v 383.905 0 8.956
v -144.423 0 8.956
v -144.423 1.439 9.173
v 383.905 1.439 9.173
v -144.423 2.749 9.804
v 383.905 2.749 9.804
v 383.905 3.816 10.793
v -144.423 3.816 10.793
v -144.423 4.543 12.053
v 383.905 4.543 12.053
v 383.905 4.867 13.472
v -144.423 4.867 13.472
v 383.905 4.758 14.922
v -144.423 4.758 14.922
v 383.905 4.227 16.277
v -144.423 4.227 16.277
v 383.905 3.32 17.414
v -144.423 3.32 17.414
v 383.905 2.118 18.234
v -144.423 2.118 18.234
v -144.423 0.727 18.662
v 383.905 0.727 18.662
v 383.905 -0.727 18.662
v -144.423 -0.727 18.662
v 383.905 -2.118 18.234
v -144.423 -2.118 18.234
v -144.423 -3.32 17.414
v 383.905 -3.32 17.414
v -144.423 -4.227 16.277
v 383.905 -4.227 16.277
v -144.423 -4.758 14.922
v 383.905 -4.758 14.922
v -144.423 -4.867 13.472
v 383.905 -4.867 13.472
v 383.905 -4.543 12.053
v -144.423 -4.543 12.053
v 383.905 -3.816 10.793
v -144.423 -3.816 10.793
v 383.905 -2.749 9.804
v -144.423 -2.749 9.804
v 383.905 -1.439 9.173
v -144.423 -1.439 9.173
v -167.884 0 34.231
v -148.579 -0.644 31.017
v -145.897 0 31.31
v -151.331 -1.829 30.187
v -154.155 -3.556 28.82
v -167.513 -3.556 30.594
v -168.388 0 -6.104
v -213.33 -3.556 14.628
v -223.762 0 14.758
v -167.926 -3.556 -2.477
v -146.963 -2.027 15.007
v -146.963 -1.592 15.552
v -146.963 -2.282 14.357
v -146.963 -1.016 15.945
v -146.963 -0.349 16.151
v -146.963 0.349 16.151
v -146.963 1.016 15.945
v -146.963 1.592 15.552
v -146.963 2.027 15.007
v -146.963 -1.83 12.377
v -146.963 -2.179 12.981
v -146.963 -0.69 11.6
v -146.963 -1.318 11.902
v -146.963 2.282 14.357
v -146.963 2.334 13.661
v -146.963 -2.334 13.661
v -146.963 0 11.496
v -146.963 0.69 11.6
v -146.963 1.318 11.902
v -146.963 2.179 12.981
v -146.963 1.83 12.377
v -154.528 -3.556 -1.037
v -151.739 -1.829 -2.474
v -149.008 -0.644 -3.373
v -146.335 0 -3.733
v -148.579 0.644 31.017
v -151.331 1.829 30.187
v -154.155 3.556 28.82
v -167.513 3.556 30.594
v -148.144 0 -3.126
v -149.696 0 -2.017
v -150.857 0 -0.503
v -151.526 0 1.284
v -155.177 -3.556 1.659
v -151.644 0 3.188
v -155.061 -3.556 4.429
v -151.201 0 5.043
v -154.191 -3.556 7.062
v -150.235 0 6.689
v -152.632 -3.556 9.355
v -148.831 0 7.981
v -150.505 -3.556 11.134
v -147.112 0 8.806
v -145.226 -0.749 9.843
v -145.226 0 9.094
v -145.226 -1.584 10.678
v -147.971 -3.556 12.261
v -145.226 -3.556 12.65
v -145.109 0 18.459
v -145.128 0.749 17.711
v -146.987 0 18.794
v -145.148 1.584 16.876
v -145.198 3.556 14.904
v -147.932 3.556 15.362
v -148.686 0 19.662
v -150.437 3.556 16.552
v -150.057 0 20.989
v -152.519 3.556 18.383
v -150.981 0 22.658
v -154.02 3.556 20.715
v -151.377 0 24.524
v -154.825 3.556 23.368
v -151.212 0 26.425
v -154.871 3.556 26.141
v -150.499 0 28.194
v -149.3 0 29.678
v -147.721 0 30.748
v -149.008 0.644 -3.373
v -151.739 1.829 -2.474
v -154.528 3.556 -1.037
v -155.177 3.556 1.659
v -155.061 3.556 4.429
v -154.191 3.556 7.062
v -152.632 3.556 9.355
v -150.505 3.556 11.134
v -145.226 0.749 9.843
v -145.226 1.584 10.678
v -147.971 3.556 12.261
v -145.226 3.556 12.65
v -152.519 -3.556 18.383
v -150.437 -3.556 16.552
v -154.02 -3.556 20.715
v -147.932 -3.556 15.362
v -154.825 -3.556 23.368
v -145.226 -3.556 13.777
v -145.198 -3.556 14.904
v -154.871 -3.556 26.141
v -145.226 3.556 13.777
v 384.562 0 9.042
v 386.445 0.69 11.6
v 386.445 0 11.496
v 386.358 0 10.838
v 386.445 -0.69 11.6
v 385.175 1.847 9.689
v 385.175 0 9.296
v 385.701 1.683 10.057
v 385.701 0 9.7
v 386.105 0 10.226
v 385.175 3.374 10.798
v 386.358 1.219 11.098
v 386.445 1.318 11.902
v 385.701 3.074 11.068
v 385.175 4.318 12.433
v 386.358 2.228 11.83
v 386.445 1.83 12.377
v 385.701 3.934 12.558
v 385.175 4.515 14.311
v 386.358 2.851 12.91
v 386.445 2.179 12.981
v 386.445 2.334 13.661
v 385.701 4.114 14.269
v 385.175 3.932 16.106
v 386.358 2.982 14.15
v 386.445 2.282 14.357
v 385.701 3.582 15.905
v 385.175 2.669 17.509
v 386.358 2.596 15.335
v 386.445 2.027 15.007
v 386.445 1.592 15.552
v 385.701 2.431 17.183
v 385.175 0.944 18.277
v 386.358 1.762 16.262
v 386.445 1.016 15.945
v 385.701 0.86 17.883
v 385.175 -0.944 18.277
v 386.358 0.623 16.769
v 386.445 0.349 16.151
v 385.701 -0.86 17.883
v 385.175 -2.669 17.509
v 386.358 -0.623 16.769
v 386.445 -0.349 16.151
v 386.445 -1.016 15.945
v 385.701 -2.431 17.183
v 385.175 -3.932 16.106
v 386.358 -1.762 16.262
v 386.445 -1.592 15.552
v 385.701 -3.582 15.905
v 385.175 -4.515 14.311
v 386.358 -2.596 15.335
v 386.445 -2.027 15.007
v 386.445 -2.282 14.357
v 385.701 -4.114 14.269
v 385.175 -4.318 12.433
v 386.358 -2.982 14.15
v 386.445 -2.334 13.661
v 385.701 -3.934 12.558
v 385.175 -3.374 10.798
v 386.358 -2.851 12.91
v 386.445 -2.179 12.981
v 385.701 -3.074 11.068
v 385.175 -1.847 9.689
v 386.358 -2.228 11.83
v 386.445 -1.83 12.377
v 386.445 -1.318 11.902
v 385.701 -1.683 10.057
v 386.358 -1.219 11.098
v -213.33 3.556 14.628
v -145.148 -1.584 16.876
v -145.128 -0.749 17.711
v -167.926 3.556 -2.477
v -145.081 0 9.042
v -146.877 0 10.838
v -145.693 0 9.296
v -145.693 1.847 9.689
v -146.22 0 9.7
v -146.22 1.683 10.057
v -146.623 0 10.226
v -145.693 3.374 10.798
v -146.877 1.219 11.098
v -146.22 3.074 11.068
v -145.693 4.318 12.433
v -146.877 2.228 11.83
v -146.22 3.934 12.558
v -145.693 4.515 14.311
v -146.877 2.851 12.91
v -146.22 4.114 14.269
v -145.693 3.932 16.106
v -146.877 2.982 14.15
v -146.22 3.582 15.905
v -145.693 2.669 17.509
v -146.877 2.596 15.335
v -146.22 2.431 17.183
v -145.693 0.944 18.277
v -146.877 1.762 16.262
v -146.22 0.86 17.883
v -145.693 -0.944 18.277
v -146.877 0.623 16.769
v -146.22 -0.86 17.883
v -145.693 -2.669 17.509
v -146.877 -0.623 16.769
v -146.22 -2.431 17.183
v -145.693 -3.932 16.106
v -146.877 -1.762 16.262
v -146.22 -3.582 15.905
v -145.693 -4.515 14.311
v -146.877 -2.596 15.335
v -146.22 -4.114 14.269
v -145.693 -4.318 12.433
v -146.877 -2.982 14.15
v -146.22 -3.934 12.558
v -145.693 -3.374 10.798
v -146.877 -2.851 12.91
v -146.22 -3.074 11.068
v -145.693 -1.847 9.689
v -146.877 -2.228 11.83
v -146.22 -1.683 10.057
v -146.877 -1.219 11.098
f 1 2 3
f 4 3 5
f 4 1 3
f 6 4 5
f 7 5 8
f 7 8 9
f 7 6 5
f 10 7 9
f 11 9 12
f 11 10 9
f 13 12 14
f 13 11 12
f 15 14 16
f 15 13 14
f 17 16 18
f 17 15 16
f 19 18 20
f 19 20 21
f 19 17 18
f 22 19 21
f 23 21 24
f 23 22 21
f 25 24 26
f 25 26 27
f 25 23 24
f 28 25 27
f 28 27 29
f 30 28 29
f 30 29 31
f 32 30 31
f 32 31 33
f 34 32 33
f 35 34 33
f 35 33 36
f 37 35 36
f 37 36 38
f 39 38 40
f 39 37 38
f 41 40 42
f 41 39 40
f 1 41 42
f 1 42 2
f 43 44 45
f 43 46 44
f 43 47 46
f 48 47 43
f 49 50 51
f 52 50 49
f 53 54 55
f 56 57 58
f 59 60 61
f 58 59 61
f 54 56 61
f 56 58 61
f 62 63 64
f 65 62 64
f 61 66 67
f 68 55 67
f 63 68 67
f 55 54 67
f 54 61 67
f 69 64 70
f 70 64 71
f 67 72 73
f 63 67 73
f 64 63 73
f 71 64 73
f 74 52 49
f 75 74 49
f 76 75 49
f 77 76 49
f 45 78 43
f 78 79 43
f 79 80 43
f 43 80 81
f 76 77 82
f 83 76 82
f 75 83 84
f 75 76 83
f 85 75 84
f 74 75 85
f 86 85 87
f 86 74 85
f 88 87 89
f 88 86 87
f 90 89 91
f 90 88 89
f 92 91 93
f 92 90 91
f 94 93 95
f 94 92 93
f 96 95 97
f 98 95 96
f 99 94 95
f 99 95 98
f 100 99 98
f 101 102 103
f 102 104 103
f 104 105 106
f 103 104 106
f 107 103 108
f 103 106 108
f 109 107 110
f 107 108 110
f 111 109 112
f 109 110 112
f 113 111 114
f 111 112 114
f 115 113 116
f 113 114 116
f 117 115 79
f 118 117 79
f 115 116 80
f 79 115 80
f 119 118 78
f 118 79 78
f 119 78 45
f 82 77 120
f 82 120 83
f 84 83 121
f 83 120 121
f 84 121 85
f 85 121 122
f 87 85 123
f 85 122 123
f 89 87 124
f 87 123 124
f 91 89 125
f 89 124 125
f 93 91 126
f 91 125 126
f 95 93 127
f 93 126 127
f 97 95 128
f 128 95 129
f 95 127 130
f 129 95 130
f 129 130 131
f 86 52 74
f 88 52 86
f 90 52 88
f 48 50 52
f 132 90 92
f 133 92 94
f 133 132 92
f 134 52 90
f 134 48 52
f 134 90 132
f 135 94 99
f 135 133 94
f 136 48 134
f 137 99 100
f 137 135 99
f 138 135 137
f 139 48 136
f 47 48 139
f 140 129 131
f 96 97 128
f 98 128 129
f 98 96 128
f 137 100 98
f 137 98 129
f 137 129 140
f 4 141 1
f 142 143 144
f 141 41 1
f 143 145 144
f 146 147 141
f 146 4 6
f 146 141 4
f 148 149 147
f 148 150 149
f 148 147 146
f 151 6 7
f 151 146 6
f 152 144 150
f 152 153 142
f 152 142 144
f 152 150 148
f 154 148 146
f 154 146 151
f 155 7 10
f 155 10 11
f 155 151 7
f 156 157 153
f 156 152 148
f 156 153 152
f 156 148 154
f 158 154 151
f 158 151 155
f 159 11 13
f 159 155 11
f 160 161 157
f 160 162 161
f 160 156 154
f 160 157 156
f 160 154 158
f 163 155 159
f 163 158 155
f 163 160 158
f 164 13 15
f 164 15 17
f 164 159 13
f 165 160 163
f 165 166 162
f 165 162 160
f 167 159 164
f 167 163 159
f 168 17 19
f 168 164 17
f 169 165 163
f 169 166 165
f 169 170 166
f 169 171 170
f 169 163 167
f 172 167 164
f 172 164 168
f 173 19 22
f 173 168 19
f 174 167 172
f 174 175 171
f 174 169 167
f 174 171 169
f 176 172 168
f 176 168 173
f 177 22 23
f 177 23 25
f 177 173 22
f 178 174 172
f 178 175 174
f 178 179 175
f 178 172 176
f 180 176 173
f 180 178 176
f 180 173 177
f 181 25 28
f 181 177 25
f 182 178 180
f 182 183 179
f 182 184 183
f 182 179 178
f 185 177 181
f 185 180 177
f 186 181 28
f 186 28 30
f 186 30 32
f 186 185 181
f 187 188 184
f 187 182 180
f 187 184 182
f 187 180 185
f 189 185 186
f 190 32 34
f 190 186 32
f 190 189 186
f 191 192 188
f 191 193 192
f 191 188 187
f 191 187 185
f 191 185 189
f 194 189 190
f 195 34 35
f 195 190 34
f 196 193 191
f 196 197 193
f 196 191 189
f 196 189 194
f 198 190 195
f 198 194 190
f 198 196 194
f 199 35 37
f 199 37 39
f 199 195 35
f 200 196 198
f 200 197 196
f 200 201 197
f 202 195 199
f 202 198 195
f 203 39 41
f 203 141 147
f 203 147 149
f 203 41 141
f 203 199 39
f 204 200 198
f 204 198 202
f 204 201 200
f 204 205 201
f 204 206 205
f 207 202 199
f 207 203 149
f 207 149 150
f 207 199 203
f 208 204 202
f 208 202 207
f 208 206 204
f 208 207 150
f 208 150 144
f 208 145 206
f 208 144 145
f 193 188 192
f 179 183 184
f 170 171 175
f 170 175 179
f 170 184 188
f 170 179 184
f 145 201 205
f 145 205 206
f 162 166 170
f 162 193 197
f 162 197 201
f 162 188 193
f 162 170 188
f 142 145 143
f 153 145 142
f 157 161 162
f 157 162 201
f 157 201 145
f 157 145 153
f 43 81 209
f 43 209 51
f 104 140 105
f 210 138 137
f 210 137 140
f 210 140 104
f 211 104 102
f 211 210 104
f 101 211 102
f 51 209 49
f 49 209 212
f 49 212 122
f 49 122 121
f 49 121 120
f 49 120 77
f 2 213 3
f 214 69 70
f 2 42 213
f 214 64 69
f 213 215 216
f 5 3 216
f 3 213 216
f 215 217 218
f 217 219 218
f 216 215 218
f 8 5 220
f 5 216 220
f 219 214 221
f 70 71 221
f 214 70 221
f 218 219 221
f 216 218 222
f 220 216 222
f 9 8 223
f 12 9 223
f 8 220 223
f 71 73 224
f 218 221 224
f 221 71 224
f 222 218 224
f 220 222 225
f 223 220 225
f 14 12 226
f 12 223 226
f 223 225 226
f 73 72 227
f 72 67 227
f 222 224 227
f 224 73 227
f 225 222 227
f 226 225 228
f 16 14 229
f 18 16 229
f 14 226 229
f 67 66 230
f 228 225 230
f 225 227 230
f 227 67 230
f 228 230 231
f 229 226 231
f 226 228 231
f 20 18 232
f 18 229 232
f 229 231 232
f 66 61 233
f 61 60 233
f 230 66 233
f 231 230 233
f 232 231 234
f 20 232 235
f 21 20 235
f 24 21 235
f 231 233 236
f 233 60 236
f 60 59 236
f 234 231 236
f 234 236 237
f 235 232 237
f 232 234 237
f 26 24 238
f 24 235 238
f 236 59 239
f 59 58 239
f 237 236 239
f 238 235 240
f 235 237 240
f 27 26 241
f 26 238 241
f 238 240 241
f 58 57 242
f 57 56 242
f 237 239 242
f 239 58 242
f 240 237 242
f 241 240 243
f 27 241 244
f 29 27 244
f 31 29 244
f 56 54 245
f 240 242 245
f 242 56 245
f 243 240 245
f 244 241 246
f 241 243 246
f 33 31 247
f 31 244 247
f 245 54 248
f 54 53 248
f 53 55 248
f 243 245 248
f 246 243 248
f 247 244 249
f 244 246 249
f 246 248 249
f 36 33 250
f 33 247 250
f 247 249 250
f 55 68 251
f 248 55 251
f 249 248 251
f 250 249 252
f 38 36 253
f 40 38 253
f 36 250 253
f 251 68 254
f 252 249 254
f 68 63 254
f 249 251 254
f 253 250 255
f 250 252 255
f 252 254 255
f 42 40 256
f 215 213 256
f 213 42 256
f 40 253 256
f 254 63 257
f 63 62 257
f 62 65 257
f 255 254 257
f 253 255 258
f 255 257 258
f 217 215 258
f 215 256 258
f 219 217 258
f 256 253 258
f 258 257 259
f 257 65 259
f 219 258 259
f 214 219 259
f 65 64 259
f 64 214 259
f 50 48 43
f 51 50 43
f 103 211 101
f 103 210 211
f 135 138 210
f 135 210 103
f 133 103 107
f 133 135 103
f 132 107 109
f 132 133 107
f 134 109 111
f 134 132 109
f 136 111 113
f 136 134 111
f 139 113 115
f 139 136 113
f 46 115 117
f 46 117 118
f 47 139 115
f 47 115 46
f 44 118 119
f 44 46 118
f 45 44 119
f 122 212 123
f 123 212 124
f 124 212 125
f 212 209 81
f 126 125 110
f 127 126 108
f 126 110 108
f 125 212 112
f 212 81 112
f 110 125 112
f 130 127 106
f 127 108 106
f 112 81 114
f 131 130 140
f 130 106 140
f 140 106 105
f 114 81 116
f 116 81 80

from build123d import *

# Parameters (mm, degrees)
F0_W     = 533.4084779024
F0_H     = 4.8805493861
F3_R     = 2.54
F4_DEPTH = 3.556
F5_SIZE  = 3.55599
F6_R     = 2.54


# Not quite as in the source:
# - a fillet or chamfer is up to 0.001 mm smaller than in the source, because OpenCascade refuses the exact size
# - a feature names something its author has since deleted; it is built from what else it names


with BuildPart() as f1:
    # F0 (on Front) → F1 (revolve)
    with BuildSketch(Plane.XZ):
        with Locations((119.7407469153, 11.39604114)):
            Rectangle(F0_W, F0_H)
    revolve(axis=Axis((119.7407469153, 0, 13.836315833), (1, 0, 0)))

    # F3
    f3_edges = [f1.edges().sort_by_distance(p)[0] for p in [
        (386.444986, 0, 18.716865),
    ]]
    fillet(f3_edges, radius=F3_R)

    # F6
    f6_edges = [f1.edges().sort_by_distance(p)[0] for p in [
        (-146.963492, 0, 18.716865),
    ]]
    fillet(f6_edges, radius=F6_R)


with BuildPart() as f4:
    # F2 (on Front) → F4 (new body, symmetric)
    with BuildSketch(Plane.XZ):
        with BuildLine():
            ThreePointArc((-146.3349759579, -3.7328371559), (-151.6437669731, 3.1876916726), (-145.2257782221, 9.0941628441))
            Line((-145.2257782221, 9.0941628441), (-145.2257782221, 13.7774241157))
            Line((-145.2257782221, 13.7774241157), (-145.1088434278, 18.4592253066))
            ThreePointArc((-145.1088434278, 18.4592253066), (-151.3773545538, 24.5241036708), (-145.8974222536, 31.3099214766))
            Line((-145.8974222536, 31.3099214766), (-167.8842370803, 34.2305423366))
            Line((-167.8842370803, 34.2305423366), (-223.7618170531, 14.7580471046))
            Line((-223.7618170531, 14.7580471046), (-168.3878600597, -6.1035659938))
            Line((-168.3878600597, -6.1035659938), (-146.3349759579, -3.7328371559))
        make_face()
    extrude(amount=F4_DEPTH, both=True)

    # F5 (size 3.556 in the source; OpenCascade refuses exactly that, so slightly less here)
    f5_edges = [f4.edges().sort_by_distance(p)[0] for p in [
        (-157.361418, 3.556, -4.918202),
        (-196.074839, 3.556, 4.327241),
        (-157.361418, -3.556, -4.918202),
        (-196.074839, -3.556, 4.327241),
        (-151.643767, -3.556, 3.187692),
        (-151.643767, 3.556, 3.187692),
        (-151.377355, -3.556, 24.524104),
        (-156.89083, -3.556, 32.770232),
        (-195.823027, -3.556, 24.494295),
        (-151.377355, 3.556, 24.524104),
        (-195.823027, 3.556, 24.494295),
        (-156.89083, 3.556, 32.770232),
    ]]
    chamfer(f5_edges, length=F5_SIZE)


solid = Compound([f1.part, f4.part])
